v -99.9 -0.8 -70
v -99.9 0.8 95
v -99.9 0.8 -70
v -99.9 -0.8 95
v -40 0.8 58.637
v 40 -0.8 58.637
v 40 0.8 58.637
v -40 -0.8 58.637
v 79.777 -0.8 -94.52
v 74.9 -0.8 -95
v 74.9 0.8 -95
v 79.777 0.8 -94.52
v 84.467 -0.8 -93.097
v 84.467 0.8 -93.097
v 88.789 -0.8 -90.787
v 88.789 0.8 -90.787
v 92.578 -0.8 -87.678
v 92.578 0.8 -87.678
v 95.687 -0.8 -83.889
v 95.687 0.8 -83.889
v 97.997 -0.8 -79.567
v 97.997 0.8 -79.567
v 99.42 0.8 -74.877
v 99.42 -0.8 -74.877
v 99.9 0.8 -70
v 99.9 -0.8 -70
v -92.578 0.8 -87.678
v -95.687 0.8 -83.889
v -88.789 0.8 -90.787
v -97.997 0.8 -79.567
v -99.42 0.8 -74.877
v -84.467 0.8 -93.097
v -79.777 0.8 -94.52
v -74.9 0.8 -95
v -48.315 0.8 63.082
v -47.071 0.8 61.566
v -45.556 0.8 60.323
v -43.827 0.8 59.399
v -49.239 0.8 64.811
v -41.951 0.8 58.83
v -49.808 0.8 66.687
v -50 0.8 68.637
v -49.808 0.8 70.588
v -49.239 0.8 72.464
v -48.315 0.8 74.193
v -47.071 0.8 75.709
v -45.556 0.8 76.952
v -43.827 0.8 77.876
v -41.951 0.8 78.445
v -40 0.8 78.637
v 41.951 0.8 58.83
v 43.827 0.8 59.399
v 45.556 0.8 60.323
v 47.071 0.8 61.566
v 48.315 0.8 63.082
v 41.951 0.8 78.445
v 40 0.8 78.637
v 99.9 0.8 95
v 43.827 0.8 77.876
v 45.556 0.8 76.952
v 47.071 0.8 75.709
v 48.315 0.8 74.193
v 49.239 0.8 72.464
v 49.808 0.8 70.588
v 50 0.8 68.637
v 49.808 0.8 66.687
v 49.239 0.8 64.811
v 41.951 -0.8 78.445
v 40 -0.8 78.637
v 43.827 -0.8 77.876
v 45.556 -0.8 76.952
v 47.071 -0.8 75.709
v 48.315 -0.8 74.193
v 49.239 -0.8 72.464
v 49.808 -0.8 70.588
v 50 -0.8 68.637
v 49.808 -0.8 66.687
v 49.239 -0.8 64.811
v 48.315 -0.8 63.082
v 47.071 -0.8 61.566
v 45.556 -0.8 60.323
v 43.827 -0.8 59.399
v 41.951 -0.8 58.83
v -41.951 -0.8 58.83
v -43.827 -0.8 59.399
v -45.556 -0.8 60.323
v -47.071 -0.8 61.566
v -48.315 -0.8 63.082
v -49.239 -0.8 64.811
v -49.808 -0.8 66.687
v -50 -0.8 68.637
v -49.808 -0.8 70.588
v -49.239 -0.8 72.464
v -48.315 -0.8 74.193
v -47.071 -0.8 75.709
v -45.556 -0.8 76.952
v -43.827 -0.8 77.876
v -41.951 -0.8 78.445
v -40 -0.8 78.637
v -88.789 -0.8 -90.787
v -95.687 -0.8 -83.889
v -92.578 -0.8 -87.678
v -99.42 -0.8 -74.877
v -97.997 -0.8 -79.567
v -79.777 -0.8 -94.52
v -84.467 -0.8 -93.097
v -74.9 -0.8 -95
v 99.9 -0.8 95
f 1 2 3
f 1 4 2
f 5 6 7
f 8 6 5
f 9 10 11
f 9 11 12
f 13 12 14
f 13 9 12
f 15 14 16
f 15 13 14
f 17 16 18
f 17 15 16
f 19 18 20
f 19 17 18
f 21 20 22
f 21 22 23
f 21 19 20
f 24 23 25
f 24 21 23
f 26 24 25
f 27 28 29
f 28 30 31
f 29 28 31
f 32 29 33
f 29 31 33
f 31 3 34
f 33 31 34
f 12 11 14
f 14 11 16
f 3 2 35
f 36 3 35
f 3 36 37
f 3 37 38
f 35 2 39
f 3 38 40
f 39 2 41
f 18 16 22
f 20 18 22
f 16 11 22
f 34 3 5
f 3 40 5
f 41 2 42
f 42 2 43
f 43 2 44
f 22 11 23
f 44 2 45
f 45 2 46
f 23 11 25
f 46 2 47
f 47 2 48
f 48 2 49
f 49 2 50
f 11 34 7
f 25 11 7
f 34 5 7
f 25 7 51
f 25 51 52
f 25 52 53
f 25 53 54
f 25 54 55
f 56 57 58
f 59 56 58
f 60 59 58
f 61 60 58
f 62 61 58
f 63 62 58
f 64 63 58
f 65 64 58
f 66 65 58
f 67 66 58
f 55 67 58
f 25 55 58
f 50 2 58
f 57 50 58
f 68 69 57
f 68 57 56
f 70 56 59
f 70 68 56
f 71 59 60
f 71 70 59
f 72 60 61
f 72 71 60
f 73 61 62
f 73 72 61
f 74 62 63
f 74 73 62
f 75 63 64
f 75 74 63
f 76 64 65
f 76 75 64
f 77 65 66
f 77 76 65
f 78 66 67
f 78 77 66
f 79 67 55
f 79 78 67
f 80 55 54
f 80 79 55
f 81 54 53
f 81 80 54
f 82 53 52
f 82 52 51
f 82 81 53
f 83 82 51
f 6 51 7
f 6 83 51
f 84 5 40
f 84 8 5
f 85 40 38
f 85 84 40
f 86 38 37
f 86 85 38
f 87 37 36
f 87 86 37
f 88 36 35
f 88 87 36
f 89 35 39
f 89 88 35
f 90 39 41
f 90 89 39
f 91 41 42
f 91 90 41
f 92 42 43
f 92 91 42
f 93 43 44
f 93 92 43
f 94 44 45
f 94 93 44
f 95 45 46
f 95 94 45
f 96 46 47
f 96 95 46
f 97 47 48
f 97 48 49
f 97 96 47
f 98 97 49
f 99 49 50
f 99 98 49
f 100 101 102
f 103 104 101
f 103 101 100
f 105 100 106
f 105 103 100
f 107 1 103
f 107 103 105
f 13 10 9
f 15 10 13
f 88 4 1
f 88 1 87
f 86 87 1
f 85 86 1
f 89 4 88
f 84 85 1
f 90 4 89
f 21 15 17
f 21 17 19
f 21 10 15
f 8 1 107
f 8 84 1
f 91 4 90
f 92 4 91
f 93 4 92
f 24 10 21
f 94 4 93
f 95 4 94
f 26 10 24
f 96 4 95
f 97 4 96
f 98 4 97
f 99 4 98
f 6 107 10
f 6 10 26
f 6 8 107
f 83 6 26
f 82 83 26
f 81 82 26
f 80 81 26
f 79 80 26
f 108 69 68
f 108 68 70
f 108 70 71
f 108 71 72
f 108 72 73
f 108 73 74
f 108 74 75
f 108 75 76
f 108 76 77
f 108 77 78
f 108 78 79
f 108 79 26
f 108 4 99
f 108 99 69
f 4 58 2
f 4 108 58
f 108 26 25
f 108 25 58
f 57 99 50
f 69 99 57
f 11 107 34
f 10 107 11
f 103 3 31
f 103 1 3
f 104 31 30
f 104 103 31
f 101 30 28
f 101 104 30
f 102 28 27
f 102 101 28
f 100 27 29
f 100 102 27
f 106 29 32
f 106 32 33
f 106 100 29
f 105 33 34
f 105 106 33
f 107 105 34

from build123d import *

# Parameters (mm, degrees)
F1_DEPTH = 0.8


with BuildPart() as f1:
    # F0 (on Front) → F1 (new body, symmetric)
    with BuildSketch(Plane.XZ):
        with BuildLine():
            ThreePointArc((-99.9, -70), (-92.57767, -87.67767), (-74.9, -95))
            Line((-74.9, -95), (74.9, -95))
            ThreePointArc((74.9, -95), (92.57767, -87.67767), (99.9, -70))
            Line((99.9, -70), (99.9, 95))
            Line((99.9, 95), (-99.9, 95))
            Line((-99.9, 95), (-99.9, -70))
        make_face()
        with BuildLine():
            ThreePointArc((40, 78.637437), (50, 68.637437), (40, 58.637437))
            Line((40, 58.637437), (0, 58.637437))
            Line((0, 58.637437), (-40, 58.637437))
            ThreePointArc((-40, 58.637437), (-50, 68.637437), (-40, 78.637437))
            Line((-40, 78.637437), (0, 78.637437))
            Line((0, 78.637437), (40, 78.637437))
        make_face(mode=Mode.SUBTRACT)
    extrude(amount=F1_DEPTH, both=True)


solid = f1.part
